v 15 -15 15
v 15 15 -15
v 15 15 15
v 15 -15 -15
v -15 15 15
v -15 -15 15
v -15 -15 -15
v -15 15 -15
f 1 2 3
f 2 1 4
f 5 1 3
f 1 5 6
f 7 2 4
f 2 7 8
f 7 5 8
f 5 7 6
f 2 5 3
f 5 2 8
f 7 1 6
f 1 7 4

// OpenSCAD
module obj()
//sphere(d=20);
//cube([25,15,20], center=true);
rotate([0,60,30]) cylinder(h=20, d=20, center=true);

color("red") obj();

d = 10;

translate([0,0,15+d])
projection()
obj();

translate([-15-d,0,0])
rotate([0,90,0]) projection()
rotate([0,-90,0]) obj();

translate([0,-15-d,0])
rotate([90,0,0]) projection()
rotate([-90,0,0]) obj();

color("#00000070")
cube([30,30,30], center=true);
